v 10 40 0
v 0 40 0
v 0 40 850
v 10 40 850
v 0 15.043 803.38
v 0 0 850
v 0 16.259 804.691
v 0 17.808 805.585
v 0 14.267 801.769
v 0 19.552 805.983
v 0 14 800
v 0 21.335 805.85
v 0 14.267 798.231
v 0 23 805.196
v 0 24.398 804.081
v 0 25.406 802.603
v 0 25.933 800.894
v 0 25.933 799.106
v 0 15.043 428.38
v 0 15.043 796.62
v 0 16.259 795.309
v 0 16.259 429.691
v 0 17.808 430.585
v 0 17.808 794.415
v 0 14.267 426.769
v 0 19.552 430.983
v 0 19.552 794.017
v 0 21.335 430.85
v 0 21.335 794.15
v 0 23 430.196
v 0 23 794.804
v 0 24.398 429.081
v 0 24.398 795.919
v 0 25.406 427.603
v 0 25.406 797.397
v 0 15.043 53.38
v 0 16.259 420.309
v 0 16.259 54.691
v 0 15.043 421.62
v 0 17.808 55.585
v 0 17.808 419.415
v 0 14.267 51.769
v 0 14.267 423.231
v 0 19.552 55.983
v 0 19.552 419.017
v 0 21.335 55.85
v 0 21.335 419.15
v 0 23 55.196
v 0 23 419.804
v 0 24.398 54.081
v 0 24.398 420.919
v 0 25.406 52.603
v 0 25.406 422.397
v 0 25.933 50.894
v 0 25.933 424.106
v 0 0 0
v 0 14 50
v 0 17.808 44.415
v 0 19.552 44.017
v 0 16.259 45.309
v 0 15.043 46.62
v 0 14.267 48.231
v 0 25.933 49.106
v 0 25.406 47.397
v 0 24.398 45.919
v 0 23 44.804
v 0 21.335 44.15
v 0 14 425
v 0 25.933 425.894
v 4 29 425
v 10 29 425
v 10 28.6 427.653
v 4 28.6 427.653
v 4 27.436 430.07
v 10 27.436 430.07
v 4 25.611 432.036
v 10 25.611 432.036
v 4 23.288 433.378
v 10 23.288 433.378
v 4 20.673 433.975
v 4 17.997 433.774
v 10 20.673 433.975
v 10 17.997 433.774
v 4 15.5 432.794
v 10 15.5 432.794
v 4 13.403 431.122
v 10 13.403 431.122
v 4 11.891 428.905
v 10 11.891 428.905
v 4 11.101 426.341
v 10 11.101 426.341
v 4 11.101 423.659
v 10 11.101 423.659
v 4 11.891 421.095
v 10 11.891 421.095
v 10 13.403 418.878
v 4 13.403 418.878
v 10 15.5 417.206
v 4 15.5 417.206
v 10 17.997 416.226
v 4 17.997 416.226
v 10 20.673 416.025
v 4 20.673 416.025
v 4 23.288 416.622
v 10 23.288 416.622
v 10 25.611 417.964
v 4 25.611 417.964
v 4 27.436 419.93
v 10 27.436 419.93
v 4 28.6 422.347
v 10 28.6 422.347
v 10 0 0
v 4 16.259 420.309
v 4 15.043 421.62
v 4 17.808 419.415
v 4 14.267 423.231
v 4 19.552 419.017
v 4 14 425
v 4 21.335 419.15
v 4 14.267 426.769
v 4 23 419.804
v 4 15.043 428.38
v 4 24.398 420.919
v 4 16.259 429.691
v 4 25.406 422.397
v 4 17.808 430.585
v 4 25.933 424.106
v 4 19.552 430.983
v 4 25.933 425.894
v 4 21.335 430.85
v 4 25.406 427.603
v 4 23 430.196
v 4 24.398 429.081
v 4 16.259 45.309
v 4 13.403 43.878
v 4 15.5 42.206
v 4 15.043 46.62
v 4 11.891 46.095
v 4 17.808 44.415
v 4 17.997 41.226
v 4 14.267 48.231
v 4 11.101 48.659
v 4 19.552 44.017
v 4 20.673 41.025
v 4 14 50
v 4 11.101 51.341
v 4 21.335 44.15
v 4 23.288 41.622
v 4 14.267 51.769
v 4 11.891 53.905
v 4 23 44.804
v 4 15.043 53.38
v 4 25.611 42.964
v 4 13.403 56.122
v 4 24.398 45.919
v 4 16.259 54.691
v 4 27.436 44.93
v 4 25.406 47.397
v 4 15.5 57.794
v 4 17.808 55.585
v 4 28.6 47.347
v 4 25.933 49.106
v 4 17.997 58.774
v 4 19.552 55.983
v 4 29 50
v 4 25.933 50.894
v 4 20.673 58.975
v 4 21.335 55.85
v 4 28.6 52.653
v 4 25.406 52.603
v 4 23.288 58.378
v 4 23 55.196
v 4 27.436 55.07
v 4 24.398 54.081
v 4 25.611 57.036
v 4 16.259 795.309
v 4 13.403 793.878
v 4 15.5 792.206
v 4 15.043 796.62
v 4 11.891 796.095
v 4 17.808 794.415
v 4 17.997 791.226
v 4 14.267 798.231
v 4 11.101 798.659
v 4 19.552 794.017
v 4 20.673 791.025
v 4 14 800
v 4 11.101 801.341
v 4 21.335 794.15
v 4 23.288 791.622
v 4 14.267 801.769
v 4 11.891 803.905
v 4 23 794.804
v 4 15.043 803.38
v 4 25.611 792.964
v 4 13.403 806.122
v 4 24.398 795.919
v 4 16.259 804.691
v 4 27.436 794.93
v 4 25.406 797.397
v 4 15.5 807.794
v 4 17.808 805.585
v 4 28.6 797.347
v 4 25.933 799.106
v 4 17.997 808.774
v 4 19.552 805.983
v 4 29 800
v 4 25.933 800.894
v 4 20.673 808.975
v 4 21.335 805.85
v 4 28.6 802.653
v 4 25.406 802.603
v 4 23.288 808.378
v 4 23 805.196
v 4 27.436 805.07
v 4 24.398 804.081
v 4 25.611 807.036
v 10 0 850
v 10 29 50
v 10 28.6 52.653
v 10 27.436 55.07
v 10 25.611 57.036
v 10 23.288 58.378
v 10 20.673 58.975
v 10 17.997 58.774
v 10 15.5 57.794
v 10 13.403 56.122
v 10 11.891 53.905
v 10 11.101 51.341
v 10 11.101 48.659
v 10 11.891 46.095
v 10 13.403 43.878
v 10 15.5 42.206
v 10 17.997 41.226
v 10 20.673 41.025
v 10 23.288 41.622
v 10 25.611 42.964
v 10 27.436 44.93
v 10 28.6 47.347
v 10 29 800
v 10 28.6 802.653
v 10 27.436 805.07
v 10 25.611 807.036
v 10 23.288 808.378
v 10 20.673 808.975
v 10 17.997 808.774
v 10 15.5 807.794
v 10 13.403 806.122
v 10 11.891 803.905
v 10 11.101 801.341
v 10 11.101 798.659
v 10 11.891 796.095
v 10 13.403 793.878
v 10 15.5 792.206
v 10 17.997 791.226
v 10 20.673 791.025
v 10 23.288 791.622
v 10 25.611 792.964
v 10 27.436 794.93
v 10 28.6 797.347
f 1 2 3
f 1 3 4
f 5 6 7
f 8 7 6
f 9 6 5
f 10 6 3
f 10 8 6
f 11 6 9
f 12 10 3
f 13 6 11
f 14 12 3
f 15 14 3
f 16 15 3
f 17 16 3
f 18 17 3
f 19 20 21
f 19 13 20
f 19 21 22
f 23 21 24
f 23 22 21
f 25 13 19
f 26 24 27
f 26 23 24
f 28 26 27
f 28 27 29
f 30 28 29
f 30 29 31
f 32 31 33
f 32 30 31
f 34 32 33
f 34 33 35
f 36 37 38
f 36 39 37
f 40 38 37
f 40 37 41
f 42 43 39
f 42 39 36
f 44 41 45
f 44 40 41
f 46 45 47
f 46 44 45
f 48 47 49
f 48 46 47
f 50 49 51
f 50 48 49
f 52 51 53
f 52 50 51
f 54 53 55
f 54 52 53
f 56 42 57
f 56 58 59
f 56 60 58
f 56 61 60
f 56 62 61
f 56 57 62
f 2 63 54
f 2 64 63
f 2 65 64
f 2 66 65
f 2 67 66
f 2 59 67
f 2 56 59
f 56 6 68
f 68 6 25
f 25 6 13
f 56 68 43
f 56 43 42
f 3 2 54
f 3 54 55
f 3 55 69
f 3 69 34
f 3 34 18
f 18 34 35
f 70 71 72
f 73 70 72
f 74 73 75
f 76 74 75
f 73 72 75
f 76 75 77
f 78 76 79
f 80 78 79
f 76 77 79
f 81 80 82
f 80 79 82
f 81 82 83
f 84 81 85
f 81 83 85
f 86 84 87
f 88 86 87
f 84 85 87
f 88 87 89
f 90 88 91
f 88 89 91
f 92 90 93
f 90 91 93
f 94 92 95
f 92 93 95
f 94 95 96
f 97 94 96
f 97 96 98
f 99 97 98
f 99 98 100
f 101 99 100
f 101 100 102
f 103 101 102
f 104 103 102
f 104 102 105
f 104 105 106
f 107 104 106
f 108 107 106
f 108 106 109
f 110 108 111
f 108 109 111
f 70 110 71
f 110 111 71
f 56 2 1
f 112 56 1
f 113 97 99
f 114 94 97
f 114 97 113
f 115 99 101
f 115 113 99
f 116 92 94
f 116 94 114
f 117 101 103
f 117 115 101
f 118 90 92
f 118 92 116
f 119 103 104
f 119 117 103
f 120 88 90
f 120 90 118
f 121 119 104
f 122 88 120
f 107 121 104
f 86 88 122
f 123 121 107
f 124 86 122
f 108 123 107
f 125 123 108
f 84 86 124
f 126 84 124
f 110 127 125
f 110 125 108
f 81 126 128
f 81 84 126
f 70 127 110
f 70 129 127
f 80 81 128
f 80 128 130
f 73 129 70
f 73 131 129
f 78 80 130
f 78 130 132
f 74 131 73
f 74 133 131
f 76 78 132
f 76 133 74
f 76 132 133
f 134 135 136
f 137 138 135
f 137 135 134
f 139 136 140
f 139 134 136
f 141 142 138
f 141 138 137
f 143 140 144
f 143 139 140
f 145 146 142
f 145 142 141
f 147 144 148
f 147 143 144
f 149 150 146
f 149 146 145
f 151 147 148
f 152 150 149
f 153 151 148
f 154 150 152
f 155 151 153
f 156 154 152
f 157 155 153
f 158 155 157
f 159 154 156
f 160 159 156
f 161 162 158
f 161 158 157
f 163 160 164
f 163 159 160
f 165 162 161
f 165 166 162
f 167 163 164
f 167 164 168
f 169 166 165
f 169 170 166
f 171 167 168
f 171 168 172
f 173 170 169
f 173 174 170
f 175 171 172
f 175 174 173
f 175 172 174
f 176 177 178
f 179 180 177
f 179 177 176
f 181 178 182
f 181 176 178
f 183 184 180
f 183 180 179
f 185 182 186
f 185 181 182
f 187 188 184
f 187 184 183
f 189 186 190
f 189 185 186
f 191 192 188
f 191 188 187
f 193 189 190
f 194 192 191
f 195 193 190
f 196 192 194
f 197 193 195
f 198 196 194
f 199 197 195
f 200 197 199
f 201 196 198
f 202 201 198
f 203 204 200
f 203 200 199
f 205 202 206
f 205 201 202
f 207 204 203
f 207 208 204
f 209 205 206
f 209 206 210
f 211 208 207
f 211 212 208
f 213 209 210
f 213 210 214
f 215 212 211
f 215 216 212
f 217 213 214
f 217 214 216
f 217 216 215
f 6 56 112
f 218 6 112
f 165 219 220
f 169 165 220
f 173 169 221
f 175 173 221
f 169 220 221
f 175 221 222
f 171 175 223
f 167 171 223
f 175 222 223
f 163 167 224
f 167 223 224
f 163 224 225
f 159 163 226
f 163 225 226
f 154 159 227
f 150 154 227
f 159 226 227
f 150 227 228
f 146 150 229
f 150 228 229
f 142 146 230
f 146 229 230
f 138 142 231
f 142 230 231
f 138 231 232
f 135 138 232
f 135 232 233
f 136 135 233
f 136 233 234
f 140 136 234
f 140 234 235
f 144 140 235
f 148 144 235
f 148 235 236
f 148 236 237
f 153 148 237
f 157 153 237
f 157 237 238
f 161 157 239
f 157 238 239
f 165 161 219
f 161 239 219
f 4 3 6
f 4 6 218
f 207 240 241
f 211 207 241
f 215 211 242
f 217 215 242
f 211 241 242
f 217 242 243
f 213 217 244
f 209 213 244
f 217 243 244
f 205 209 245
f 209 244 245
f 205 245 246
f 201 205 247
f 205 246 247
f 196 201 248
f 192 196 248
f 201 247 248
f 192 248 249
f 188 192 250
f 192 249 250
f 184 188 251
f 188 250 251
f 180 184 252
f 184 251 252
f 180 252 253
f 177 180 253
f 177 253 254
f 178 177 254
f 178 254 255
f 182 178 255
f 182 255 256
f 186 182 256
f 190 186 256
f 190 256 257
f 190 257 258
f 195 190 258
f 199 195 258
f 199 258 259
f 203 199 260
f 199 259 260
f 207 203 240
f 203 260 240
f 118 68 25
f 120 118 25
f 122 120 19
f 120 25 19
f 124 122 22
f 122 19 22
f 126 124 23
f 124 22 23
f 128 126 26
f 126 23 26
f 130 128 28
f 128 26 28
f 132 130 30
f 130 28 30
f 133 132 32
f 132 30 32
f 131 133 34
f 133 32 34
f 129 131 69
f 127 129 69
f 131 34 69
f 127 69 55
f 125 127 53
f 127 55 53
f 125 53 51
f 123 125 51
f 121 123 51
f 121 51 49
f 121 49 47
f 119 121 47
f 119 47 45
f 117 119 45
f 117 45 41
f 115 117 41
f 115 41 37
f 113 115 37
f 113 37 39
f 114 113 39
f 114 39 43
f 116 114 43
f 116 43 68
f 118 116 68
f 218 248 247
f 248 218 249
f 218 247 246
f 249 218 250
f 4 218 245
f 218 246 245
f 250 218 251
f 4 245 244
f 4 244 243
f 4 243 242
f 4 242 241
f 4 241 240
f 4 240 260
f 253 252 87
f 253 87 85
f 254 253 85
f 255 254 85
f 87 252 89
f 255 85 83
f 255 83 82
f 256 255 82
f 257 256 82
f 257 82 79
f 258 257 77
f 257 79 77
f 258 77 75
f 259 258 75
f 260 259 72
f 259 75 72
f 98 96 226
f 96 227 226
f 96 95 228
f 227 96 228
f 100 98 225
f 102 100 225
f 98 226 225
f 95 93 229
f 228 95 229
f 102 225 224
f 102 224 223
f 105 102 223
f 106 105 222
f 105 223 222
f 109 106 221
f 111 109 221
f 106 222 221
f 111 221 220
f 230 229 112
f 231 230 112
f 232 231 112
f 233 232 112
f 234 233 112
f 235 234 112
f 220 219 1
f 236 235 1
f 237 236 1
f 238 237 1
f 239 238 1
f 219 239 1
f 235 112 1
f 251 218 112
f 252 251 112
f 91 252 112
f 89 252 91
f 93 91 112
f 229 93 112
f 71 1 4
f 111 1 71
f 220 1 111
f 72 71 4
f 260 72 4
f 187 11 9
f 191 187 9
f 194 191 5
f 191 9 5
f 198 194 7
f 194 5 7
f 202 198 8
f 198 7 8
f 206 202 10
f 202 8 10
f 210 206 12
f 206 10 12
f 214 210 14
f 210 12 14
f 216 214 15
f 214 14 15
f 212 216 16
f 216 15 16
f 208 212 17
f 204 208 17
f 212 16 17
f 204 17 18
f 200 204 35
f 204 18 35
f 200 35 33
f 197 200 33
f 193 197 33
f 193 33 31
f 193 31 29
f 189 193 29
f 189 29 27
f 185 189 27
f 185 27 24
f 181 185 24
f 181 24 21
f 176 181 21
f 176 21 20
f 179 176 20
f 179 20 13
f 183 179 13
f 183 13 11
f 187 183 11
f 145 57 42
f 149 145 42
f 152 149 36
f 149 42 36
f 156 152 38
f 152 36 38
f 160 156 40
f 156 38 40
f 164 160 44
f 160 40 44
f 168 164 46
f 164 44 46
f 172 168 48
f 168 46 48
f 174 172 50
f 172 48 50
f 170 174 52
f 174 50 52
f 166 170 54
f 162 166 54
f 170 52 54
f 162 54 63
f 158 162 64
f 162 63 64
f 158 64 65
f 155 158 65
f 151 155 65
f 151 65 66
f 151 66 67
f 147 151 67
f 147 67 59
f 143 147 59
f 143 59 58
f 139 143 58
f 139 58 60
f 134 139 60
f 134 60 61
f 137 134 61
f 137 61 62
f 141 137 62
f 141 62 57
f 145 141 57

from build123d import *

# Parameters (mm, degrees)
SKETCH_W        = 10
SKETCH_H        = 40
PAD_DEPTH       = 850
SKETCH001_R     = 6
POCKET_DEPTH    = 10.001
SKETCH002_R     = 9
POCKET001_DEPTH = 6


with BuildPart() as part:
    # Sketch → Pad (new body)
    with BuildSketch(Plane.XY):
        with Locations((5, 20)):
            Rectangle(SKETCH_W, SKETCH_H)
    extrude(amount=PAD_DEPTH)

    # Sketch001 (on Face4 of Pad) → Pocket (cut, through all)
    with BuildSketch(Plane(origin=(0, 0, 0), x_dir=(0, -1, 0), z_dir=(-1, 0, 0))):
        with Locations((-20, 50)):
            Circle(SKETCH001_R)
        with Locations((-20, 425)):
            Circle(SKETCH001_R)
        with Locations((-20, 800)):
            Circle(SKETCH001_R)
    extrude(amount=-POCKET_DEPTH, mode=Mode.SUBTRACT)

    # Sketch002 (on Face3 of Pocket) → Pocket001 (cut)
    with BuildSketch(Plane.YZ.offset(10)):
        with Locations((20, 800)):
            Circle(SKETCH002_R)
        with Locations((20, 425)):
            Circle(SKETCH002_R)
        with Locations((20, 50)):
            Circle(SKETCH002_R)
    extrude(amount=-POCKET001_DEPTH, mode=Mode.SUBTRACT)


solid = part.part
